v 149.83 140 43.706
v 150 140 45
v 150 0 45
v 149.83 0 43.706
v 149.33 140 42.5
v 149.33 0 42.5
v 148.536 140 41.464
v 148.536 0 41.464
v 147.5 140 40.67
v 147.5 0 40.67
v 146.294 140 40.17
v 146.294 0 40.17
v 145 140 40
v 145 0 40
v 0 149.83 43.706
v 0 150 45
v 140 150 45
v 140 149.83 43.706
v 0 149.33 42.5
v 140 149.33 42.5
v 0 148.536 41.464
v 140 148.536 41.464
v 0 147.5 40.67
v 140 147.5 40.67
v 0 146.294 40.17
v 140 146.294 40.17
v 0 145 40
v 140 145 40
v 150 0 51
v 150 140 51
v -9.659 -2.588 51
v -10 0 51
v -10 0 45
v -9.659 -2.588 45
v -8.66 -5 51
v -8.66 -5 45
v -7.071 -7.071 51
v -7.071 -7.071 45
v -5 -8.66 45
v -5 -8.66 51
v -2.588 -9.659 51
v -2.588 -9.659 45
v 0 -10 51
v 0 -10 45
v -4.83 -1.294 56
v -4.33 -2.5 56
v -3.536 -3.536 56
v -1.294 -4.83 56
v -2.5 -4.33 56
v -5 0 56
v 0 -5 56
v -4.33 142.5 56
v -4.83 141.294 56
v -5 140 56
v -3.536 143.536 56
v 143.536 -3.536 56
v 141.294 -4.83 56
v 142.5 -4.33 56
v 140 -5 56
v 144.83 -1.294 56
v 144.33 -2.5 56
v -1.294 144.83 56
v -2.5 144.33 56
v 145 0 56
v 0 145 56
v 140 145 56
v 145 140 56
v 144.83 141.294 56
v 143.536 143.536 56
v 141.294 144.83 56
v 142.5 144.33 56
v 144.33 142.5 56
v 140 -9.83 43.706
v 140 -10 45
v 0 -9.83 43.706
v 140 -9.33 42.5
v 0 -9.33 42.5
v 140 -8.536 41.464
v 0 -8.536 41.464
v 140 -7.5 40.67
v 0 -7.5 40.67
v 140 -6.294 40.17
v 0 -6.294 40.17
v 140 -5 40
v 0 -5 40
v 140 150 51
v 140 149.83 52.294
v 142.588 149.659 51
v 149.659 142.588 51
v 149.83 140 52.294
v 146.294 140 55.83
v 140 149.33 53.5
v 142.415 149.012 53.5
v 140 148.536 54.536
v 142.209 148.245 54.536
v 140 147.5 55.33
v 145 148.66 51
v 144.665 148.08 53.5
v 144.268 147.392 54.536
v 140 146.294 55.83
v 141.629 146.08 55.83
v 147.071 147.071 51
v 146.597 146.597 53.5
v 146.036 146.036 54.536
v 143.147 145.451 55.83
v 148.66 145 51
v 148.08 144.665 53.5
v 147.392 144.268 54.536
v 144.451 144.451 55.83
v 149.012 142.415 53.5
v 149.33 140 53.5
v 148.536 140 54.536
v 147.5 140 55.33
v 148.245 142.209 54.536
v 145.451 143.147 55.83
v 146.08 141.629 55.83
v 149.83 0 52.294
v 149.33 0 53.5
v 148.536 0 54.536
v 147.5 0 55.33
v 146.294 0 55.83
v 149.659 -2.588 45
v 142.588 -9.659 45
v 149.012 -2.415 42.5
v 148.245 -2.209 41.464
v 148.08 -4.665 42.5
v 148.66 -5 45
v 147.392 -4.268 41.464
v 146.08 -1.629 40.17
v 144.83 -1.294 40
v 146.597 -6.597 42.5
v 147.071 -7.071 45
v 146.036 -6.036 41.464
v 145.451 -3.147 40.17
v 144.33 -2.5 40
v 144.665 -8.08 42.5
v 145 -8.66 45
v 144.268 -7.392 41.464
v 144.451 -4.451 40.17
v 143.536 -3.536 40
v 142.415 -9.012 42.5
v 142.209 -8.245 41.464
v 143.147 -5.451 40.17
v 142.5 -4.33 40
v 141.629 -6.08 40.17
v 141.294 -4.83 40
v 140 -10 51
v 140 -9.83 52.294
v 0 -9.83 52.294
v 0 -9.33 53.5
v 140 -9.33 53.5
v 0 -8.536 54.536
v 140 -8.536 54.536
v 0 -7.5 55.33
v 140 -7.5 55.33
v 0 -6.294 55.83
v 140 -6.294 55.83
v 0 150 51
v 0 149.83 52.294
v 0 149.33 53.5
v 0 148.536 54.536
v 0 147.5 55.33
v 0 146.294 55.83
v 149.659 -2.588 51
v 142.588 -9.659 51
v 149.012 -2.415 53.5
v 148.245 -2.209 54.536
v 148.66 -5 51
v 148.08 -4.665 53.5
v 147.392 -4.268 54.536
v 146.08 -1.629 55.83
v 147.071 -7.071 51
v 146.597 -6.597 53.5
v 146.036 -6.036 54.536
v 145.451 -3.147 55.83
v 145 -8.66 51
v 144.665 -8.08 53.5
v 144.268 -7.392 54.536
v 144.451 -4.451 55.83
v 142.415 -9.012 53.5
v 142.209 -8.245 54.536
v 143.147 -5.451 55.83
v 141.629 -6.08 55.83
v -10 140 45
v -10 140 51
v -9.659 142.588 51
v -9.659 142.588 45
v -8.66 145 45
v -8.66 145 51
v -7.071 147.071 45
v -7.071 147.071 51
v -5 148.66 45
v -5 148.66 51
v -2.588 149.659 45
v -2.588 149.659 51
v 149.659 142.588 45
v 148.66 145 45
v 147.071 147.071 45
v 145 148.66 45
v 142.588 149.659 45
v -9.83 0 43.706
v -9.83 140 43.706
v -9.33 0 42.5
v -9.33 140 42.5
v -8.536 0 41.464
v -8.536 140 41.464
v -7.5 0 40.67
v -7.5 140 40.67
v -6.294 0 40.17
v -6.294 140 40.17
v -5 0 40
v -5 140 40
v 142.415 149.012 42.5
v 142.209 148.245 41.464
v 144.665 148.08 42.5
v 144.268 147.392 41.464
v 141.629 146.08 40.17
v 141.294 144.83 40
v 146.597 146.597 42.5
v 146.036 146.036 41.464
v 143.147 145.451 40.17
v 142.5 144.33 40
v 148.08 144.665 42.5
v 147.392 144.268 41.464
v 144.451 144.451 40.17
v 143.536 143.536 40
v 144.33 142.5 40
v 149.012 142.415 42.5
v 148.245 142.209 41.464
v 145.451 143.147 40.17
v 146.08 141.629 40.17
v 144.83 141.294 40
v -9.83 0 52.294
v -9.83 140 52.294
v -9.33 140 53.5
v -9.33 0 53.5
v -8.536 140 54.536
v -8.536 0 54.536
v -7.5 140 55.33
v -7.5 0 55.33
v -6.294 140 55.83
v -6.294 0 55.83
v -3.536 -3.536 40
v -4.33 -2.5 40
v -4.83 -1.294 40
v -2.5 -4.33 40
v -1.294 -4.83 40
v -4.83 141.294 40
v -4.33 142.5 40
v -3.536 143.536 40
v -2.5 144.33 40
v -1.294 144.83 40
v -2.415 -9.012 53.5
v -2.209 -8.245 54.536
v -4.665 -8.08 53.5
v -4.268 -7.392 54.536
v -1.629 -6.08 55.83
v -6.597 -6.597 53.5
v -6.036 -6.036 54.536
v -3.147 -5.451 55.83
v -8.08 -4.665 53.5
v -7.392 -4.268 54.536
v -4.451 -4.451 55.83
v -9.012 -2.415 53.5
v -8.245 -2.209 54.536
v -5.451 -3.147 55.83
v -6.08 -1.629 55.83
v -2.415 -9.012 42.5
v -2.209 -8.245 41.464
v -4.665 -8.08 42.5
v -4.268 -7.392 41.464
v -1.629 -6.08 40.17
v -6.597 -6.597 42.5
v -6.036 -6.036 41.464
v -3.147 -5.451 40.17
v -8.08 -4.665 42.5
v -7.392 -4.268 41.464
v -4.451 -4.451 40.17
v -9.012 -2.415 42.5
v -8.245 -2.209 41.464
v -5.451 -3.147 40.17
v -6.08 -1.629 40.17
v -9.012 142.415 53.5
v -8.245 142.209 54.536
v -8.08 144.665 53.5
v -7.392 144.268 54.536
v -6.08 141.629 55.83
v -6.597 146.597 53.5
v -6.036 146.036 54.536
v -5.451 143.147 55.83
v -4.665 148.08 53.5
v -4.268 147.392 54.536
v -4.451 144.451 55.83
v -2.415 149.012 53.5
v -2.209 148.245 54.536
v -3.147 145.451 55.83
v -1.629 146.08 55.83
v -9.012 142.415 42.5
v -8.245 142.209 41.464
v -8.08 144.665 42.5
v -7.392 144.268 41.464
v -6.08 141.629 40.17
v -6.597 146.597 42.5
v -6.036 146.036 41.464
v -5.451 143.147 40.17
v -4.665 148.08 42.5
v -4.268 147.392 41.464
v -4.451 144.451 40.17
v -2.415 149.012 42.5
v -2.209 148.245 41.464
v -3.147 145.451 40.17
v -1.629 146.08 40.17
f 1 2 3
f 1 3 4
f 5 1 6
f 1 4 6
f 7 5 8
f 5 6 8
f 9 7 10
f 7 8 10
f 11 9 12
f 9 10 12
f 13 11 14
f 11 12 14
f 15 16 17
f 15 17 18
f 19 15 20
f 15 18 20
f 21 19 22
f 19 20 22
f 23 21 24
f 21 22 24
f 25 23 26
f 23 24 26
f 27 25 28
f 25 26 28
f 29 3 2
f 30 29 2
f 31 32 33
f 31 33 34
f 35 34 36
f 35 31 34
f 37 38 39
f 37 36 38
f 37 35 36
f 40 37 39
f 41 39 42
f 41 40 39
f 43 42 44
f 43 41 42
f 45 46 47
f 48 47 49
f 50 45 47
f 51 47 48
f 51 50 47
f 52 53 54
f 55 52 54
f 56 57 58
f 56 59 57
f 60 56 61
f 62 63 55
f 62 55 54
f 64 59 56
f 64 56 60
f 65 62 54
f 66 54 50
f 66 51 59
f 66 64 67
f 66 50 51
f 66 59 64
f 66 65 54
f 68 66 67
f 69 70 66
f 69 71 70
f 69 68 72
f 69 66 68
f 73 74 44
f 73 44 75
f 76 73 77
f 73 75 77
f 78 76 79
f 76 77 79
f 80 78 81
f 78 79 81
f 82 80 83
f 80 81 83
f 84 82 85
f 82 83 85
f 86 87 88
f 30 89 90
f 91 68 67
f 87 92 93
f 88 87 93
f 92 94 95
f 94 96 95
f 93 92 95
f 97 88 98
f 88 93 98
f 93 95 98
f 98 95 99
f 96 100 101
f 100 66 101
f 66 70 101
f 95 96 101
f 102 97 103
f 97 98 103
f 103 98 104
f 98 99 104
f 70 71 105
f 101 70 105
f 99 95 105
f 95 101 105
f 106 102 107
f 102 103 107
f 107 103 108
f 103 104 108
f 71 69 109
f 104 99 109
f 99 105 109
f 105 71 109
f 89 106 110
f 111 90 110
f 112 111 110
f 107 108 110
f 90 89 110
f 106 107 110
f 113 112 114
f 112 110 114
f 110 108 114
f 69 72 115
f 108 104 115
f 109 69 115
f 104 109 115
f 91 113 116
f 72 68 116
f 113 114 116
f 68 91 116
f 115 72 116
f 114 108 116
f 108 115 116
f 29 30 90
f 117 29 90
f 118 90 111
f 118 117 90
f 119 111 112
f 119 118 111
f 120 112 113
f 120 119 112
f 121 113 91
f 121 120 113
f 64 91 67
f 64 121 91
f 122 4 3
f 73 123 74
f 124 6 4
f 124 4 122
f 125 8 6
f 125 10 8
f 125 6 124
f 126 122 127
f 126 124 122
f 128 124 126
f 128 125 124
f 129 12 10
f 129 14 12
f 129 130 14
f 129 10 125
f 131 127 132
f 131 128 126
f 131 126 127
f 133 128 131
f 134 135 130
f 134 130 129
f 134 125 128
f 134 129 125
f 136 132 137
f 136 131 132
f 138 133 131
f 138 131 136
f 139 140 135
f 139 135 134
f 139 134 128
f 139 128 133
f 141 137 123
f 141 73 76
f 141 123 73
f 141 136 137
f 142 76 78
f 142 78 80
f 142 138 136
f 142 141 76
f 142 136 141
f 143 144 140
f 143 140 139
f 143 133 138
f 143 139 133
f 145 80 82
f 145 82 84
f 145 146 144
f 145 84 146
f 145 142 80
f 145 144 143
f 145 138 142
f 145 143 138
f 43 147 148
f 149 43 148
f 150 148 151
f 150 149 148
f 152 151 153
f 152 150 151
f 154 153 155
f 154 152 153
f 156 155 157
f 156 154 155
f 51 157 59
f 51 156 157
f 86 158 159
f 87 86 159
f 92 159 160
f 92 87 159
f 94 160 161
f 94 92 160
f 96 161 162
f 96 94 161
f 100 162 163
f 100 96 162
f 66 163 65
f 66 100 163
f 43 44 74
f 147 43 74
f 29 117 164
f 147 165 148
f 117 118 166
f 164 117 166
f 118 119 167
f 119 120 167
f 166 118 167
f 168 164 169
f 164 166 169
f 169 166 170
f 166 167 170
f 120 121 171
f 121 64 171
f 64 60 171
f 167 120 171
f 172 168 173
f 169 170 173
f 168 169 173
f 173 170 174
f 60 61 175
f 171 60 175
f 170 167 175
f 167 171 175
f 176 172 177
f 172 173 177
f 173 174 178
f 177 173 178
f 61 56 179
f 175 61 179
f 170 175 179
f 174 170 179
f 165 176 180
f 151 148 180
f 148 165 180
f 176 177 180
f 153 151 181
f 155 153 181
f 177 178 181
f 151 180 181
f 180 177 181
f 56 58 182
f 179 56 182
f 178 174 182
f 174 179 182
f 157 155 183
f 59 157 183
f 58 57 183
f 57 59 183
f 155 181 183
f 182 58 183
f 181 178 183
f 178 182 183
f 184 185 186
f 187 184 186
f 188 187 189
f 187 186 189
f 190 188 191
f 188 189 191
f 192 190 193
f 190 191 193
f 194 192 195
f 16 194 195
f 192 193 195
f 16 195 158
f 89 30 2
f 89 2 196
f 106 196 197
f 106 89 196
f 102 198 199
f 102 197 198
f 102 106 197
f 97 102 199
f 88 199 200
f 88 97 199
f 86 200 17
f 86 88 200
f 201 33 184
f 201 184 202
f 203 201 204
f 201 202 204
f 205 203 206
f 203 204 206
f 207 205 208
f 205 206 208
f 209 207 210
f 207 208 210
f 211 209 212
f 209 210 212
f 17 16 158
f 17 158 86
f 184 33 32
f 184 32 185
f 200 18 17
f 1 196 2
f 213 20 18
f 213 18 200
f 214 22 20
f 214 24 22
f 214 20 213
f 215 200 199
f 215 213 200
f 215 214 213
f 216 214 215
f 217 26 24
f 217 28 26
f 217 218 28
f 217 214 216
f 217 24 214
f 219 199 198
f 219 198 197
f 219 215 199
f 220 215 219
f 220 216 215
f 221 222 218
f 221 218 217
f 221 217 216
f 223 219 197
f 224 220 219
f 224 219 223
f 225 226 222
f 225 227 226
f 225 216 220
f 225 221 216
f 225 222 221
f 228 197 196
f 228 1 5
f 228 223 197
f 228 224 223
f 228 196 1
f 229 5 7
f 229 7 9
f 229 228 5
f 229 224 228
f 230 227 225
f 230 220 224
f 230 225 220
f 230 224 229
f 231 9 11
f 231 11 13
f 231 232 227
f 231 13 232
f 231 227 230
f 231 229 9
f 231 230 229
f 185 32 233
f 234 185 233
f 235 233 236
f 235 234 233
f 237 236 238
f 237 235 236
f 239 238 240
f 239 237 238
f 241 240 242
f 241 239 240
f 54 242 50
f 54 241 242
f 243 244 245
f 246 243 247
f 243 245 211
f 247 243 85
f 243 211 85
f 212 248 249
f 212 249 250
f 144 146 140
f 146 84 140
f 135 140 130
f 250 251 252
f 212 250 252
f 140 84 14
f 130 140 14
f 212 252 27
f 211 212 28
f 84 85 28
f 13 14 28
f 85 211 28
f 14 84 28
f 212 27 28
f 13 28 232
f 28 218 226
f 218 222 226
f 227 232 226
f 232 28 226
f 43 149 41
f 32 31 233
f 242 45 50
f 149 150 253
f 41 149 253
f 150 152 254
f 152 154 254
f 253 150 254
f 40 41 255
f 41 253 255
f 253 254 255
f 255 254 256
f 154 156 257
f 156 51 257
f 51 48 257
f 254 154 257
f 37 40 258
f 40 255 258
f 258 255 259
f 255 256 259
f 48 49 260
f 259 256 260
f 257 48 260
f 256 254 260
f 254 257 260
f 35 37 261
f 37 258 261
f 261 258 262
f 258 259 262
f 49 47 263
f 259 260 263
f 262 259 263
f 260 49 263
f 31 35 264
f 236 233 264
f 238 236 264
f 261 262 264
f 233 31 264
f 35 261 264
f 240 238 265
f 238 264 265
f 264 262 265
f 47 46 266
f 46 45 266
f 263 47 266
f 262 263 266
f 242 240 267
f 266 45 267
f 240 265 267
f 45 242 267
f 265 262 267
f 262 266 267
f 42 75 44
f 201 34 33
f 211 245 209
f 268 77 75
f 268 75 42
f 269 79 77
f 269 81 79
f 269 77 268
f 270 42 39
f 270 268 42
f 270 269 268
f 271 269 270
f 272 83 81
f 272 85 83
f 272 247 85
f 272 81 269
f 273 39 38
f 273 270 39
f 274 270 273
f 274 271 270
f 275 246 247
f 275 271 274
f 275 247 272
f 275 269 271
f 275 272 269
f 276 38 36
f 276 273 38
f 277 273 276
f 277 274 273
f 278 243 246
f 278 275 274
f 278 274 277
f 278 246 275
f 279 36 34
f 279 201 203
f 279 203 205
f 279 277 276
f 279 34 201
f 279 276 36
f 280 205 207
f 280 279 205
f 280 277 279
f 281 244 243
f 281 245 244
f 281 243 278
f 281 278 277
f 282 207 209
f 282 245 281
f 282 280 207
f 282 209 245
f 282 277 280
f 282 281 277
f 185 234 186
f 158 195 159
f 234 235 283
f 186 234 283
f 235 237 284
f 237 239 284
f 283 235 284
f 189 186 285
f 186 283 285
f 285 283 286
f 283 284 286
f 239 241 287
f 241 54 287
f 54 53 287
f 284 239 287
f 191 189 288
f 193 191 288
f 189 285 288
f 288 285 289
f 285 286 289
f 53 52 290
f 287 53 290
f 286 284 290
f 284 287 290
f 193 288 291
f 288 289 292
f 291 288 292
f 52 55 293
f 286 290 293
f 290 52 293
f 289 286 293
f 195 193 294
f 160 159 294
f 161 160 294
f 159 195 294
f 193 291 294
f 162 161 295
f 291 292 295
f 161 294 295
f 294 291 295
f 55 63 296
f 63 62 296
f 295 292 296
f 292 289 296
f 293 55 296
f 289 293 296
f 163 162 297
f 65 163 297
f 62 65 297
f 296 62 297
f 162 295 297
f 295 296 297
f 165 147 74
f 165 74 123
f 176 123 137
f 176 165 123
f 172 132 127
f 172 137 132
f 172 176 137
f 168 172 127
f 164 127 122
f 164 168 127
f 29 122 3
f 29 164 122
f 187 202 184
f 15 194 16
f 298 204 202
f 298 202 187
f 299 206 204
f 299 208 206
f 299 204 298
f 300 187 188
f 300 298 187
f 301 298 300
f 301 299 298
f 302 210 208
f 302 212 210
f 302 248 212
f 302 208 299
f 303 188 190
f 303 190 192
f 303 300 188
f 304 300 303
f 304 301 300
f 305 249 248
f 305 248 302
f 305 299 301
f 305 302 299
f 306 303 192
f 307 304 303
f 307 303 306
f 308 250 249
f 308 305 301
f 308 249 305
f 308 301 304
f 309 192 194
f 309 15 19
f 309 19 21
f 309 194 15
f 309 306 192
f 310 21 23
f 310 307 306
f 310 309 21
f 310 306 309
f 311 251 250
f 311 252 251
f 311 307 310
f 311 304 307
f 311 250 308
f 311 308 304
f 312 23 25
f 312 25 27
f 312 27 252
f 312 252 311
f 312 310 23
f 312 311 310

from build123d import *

# Parameters (mm, degrees)
BOX009_W     = 160
BOX009_H     = 160
BOX009_DEPTH = 16
FILLET_R     = 10
FILLET001_R  = 5
FILLET002_R  = 5


with BuildPart() as part:
    # Box009 → Box009 (new body)
    with BuildSketch(Plane.XY):
        with Locations((80, 80)):
            Rectangle(BOX009_W, BOX009_H)
    extrude(amount=BOX009_DEPTH)

    # Fillet
    fillet_edges = [part.edges().sort_by_distance(p)[0] for p in [
        (0, 0, 8),
        (0, 160, 8),
        (160, 0, 8),
        (160, 160, 8),
    ]]
    fillet(fillet_edges, radius=FILLET_R)

    # Fillet001
    fillet001_edges = [part.edges().sort_by_distance(p)[0] for p in [
        (0, 80, 16),
        (2.928932, 2.928932, 16),
        (2.928932, 157.071068, 16),
        (80, 0, 16),
        (80, 160, 16),
        (157.071068, 2.928932, 16),
        (157.071068, 157.071068, 16),
        (160, 80, 16),
    ]]
    fillet(fillet001_edges, radius=FILLET001_R)

    # Fillet002
    fillet002_edges = [part.edges().sort_by_distance(p)[0] for p in [
        (0, 80, 0),
        (2.928932, 2.928932, 0),
        (2.928932, 157.071068, 0),
        (80, 0, 0),
        (80, 160, 0),
        (157.071068, 2.928932, 0),
        (157.071068, 157.071068, 0),
        (160, 80, 0),
    ]]
    fillet(fillet002_edges, radius=FILLET002_R)


with BuildPart() as part_1:
    # Fillet002 placement: moved
    add(part.part.moved(Location((-10, -10, 40))))


solid = part_1.part
